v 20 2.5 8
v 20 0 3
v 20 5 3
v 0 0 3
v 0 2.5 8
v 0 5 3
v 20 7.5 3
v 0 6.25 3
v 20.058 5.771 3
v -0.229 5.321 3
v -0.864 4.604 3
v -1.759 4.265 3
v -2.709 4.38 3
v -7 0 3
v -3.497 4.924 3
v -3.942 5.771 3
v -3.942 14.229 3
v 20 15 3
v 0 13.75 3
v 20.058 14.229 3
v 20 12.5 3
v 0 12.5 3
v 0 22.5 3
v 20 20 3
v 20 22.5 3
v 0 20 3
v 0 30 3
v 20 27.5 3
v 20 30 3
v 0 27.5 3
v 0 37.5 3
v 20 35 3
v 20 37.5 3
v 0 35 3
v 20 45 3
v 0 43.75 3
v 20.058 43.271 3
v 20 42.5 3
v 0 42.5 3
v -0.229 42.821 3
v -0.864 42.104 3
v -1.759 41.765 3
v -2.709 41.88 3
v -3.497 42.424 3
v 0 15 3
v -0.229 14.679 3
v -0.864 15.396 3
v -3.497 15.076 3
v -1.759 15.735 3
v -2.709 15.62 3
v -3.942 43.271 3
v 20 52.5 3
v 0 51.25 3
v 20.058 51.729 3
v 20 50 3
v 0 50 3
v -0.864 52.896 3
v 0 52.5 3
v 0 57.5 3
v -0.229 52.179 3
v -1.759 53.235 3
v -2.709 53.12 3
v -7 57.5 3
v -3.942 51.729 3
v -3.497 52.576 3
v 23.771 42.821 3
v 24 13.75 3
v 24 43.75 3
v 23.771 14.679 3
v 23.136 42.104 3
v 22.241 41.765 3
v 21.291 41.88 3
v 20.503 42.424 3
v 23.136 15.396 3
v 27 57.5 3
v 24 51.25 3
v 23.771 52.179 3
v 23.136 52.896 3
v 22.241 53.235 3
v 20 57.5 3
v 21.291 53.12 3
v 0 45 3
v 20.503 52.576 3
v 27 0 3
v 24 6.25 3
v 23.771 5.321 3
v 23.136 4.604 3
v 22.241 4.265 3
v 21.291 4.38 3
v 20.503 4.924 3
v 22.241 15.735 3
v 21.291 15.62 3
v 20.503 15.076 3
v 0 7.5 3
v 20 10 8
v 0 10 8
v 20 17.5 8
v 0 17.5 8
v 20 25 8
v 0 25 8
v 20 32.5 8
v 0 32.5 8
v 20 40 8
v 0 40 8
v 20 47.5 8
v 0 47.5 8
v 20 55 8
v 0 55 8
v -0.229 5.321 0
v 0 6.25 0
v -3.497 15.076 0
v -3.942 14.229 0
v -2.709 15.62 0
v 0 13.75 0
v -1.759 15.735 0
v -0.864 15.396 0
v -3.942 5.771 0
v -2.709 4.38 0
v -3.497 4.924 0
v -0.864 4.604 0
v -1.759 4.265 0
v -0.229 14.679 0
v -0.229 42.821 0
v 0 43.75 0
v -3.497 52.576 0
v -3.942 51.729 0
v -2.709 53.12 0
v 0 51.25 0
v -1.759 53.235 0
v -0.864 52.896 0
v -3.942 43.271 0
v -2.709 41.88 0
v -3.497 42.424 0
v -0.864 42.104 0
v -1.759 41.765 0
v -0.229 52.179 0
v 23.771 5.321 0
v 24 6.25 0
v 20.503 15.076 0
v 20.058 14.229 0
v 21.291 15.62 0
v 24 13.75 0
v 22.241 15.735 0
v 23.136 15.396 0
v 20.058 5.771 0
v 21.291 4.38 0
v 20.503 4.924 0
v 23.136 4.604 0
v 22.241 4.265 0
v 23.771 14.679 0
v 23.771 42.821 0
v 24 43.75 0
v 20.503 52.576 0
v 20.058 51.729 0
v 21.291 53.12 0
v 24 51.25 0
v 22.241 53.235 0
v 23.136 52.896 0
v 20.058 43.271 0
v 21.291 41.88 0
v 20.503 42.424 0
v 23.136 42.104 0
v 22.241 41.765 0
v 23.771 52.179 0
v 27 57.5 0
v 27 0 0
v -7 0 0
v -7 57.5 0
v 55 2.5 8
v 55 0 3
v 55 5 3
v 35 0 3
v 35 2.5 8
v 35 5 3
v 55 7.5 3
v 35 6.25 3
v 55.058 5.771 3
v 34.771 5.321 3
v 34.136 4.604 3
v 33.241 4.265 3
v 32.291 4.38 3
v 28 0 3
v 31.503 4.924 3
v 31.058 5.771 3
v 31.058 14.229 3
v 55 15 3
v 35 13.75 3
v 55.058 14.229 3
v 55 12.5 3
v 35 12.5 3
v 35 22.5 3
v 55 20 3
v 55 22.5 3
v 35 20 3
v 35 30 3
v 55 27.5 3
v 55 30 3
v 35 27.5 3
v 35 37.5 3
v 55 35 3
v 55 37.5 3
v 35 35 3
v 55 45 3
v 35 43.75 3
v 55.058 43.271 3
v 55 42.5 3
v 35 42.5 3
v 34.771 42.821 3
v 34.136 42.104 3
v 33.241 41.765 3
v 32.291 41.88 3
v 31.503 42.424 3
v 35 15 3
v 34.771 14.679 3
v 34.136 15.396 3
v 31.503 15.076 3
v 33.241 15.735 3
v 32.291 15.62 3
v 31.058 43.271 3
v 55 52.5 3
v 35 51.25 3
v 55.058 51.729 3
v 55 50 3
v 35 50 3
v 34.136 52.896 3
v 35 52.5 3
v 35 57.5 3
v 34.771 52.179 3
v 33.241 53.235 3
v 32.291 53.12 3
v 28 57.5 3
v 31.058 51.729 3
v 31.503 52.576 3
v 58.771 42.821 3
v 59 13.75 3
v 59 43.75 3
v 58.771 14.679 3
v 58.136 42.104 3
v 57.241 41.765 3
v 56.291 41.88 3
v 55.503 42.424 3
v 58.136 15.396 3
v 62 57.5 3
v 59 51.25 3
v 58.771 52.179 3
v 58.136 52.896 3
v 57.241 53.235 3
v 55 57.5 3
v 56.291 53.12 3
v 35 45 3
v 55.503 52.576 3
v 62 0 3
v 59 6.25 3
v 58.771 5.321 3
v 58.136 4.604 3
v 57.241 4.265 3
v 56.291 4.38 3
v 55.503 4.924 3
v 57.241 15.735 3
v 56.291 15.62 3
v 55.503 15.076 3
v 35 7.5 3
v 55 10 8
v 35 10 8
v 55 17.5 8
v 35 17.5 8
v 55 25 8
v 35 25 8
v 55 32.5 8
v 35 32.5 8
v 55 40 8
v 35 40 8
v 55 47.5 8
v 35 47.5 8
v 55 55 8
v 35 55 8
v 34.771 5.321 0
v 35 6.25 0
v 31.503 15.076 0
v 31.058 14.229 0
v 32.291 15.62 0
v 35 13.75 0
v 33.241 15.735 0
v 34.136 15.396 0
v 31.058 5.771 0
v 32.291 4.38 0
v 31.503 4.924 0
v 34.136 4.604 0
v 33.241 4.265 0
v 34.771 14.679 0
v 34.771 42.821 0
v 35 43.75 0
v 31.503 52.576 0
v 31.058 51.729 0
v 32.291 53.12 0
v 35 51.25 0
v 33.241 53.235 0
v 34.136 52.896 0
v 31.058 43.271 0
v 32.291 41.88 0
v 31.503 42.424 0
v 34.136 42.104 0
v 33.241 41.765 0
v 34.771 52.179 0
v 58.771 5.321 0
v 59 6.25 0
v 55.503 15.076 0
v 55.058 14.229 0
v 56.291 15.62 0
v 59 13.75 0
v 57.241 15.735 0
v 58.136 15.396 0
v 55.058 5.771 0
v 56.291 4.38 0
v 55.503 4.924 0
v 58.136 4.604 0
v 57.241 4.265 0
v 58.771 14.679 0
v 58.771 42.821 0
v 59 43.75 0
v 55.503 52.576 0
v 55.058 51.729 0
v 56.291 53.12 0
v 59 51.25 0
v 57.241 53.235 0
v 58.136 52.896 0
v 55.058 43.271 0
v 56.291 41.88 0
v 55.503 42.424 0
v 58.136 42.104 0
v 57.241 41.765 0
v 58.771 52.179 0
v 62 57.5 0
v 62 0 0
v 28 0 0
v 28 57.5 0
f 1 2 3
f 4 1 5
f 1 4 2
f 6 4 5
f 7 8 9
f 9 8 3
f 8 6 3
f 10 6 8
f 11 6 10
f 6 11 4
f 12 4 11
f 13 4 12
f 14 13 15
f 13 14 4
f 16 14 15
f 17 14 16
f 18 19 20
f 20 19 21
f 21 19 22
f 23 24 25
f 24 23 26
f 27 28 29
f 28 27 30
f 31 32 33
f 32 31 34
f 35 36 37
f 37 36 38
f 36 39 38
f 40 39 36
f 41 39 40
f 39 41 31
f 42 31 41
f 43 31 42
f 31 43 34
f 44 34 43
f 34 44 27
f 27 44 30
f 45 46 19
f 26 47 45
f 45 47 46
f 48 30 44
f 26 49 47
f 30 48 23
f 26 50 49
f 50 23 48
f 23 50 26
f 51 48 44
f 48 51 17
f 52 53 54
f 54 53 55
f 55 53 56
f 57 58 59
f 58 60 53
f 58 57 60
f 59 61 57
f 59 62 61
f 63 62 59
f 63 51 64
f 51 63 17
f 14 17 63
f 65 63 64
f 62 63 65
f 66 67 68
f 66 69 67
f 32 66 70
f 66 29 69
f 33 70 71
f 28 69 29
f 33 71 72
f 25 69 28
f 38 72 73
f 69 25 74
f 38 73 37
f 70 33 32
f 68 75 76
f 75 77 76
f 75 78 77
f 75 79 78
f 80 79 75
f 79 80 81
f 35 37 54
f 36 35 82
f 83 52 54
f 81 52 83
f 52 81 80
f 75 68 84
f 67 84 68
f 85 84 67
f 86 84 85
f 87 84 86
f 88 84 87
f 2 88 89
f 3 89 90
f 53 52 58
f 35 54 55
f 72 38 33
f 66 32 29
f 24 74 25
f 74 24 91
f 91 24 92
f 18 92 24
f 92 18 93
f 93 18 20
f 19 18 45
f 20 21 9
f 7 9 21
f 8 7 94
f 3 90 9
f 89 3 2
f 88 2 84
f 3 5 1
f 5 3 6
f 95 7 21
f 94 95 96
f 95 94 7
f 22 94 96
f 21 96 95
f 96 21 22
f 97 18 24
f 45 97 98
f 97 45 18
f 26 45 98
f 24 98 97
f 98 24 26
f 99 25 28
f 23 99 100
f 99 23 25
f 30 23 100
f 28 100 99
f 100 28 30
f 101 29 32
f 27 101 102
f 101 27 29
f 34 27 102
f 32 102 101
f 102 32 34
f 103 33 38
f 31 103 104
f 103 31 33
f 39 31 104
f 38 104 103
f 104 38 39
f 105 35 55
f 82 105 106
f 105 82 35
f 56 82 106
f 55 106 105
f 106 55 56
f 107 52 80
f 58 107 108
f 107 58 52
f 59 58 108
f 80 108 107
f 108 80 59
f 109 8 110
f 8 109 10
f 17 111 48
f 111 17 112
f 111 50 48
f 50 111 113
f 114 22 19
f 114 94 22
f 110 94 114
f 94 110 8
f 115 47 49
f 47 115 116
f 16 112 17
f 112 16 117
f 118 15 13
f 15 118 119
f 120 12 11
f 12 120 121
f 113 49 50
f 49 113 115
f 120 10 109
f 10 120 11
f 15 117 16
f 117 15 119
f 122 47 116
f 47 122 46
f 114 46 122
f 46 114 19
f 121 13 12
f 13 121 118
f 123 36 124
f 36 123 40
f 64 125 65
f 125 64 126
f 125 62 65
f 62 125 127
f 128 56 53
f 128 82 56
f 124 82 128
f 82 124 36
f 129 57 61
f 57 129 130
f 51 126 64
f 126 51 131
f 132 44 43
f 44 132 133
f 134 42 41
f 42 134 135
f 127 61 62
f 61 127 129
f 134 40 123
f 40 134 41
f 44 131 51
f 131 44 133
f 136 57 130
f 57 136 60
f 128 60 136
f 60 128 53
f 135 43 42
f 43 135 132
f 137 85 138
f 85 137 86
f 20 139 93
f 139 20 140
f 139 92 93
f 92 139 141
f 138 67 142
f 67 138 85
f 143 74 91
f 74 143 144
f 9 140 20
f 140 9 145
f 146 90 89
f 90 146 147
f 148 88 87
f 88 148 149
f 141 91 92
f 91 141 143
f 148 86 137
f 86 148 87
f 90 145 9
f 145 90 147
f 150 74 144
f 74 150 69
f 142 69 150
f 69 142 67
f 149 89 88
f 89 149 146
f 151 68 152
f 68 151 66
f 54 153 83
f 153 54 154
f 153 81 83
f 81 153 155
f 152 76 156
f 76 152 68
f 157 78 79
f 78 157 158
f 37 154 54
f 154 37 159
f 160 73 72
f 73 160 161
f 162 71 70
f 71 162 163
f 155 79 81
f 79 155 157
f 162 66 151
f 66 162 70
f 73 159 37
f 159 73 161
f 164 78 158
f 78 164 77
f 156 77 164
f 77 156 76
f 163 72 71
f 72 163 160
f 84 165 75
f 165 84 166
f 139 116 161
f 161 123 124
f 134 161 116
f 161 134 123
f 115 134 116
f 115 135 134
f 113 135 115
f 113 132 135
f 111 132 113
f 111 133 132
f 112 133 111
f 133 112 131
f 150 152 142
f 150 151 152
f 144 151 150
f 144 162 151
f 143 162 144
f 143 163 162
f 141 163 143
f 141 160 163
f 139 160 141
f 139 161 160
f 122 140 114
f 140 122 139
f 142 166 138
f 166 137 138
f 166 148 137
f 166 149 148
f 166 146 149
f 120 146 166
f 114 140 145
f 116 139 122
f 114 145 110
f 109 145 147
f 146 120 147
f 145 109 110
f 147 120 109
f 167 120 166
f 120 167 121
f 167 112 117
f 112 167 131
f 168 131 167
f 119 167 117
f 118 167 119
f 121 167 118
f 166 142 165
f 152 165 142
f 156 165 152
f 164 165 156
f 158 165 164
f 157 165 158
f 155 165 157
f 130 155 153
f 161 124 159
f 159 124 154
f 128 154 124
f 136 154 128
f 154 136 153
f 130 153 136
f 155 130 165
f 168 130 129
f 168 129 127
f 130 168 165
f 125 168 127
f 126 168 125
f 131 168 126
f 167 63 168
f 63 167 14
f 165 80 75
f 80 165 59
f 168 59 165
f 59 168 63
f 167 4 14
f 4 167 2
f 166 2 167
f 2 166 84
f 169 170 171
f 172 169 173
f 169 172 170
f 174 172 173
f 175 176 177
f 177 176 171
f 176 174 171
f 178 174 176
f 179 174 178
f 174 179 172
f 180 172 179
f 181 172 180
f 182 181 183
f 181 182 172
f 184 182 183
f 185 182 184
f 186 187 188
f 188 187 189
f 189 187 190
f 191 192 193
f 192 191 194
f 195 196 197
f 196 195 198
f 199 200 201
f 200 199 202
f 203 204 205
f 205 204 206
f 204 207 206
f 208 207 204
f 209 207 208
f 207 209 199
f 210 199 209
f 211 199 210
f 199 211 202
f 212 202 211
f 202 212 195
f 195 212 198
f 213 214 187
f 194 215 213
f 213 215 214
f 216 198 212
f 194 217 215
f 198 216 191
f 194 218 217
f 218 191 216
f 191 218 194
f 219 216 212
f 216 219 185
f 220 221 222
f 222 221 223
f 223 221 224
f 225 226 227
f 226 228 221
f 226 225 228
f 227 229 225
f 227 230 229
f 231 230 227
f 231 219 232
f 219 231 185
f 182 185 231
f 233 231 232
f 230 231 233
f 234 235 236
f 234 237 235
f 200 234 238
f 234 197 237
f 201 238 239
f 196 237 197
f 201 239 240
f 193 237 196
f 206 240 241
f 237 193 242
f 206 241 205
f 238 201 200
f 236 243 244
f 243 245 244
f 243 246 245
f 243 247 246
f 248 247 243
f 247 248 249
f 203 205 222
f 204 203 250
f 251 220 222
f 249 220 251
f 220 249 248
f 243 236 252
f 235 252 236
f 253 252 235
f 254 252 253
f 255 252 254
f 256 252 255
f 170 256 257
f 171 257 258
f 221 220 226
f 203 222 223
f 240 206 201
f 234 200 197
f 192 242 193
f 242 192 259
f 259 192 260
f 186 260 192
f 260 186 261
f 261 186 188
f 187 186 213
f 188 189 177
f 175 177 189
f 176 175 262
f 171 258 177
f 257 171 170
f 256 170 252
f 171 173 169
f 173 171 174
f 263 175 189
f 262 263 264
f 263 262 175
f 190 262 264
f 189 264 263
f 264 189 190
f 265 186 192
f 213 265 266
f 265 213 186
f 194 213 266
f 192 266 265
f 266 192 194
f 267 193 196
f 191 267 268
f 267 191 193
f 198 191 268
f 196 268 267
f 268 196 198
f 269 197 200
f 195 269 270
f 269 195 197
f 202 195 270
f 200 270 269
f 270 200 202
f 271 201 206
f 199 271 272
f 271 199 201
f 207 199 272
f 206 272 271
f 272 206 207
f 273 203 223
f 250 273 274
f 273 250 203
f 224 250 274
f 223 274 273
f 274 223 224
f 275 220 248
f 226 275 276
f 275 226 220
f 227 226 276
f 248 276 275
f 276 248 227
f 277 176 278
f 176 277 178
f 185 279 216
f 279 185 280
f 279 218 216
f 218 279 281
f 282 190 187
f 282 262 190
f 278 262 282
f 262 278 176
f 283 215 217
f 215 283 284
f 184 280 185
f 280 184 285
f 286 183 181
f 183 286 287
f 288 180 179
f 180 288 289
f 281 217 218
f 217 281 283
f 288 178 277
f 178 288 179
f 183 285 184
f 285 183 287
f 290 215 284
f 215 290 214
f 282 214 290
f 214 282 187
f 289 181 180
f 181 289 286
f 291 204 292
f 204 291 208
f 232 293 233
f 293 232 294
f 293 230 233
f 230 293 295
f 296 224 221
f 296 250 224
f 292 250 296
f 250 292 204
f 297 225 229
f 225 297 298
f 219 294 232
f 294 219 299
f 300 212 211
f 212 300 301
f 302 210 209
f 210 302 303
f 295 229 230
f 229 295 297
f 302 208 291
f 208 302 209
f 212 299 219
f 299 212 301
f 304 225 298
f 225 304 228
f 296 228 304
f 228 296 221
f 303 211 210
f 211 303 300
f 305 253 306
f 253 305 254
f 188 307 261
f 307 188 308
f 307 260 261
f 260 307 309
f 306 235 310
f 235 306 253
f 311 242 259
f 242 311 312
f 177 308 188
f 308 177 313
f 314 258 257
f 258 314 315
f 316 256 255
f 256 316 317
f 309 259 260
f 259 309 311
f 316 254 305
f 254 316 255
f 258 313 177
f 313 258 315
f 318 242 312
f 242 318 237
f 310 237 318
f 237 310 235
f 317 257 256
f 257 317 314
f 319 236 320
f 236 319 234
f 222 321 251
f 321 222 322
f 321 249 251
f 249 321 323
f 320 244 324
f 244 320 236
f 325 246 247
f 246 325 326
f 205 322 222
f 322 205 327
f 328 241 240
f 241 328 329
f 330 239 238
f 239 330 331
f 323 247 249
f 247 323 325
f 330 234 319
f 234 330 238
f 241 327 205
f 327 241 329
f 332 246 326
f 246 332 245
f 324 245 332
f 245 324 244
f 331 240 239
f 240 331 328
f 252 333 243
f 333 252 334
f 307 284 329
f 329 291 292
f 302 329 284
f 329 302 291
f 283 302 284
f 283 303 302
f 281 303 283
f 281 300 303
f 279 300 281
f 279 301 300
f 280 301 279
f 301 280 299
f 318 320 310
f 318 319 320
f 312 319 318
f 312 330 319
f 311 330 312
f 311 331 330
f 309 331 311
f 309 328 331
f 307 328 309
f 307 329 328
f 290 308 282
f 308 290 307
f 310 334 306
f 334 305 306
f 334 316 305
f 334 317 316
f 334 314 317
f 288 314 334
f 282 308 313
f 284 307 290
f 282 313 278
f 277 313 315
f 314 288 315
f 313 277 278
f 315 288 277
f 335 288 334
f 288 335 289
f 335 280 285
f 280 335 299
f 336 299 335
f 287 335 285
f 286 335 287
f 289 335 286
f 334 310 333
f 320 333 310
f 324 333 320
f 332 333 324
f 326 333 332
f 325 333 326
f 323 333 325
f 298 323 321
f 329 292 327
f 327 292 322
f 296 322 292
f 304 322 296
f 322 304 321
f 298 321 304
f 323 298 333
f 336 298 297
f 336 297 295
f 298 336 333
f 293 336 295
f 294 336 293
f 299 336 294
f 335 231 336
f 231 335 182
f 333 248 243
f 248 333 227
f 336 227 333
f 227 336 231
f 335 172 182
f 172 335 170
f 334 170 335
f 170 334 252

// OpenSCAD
count=2;

module tusk(h, l)
{
  translate([l,0,0])
    rotate([0,0,90])
      polyhedron(
        points=[
                 [0,   0,  0],  // 0
                 [h,   0,  0],  // 1
                 [h/2, 0,  h],  // 2
                 [0,   l,  0],  // 3
                 [h,   l,  0],  // 4
                 [h/2, l,  h]   // 5
               ],
        faces=[
                [0,2,1],
                [0,1,4],
                [4,3,0],
                [1,2,5],
                [5,4,1],
                [0,5,2],
                [3,5,0],
                [3,4,5]
              ]
      );
}

module side()
{
  w =20; // width
  tc=8;  // Tusks Count
  th=5;  // Tusk Height
  ph=3;  // Platform Height
  l =tc*1.5*th-0.5*th; // length
  // tusks:
  for(dy = [0:tc-1])
    translate([0, dy*1.5*th, ph])
      tusk(h=th, l=w);
  // base and mount
  phi=4; // diameter for screw
  pad=3; // padding around each hole
  ext=phi+pad; // external element size
  difference()
  {
    union()
    {
      translate([-ext,0,0])
        cube([w+2*ext, l, ph]);
    }
    // screw mounts
    for(dx = [-phi/2, w+phi/2])
      for(dy = [0, (tc-2)*th*1.5-th*1.5])
        translate([dx, dy+1.5*th-th/4, -ph])
          hull()
            for(offy = [0, th*1.5])
              translate([0,offy,0])
                cylinder(h=ph*3, r=phi/2, $fs=1);
  }
}


for(i = [0:count-1])
  translate([i*35,0,0])
    side();

%translate([20, 4, 15])
%  rotate([0,180,0])
%    side();
